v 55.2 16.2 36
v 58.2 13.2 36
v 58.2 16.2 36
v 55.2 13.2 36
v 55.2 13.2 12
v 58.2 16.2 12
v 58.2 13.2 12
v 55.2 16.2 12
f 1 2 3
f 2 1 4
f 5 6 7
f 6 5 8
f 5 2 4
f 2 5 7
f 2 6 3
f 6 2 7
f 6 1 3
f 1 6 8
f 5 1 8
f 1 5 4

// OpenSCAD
translate(v = [55.2, 13.200000000000001, 12.0]) {
	cube(size = [3.0, 3.0, 24.0]);
}
